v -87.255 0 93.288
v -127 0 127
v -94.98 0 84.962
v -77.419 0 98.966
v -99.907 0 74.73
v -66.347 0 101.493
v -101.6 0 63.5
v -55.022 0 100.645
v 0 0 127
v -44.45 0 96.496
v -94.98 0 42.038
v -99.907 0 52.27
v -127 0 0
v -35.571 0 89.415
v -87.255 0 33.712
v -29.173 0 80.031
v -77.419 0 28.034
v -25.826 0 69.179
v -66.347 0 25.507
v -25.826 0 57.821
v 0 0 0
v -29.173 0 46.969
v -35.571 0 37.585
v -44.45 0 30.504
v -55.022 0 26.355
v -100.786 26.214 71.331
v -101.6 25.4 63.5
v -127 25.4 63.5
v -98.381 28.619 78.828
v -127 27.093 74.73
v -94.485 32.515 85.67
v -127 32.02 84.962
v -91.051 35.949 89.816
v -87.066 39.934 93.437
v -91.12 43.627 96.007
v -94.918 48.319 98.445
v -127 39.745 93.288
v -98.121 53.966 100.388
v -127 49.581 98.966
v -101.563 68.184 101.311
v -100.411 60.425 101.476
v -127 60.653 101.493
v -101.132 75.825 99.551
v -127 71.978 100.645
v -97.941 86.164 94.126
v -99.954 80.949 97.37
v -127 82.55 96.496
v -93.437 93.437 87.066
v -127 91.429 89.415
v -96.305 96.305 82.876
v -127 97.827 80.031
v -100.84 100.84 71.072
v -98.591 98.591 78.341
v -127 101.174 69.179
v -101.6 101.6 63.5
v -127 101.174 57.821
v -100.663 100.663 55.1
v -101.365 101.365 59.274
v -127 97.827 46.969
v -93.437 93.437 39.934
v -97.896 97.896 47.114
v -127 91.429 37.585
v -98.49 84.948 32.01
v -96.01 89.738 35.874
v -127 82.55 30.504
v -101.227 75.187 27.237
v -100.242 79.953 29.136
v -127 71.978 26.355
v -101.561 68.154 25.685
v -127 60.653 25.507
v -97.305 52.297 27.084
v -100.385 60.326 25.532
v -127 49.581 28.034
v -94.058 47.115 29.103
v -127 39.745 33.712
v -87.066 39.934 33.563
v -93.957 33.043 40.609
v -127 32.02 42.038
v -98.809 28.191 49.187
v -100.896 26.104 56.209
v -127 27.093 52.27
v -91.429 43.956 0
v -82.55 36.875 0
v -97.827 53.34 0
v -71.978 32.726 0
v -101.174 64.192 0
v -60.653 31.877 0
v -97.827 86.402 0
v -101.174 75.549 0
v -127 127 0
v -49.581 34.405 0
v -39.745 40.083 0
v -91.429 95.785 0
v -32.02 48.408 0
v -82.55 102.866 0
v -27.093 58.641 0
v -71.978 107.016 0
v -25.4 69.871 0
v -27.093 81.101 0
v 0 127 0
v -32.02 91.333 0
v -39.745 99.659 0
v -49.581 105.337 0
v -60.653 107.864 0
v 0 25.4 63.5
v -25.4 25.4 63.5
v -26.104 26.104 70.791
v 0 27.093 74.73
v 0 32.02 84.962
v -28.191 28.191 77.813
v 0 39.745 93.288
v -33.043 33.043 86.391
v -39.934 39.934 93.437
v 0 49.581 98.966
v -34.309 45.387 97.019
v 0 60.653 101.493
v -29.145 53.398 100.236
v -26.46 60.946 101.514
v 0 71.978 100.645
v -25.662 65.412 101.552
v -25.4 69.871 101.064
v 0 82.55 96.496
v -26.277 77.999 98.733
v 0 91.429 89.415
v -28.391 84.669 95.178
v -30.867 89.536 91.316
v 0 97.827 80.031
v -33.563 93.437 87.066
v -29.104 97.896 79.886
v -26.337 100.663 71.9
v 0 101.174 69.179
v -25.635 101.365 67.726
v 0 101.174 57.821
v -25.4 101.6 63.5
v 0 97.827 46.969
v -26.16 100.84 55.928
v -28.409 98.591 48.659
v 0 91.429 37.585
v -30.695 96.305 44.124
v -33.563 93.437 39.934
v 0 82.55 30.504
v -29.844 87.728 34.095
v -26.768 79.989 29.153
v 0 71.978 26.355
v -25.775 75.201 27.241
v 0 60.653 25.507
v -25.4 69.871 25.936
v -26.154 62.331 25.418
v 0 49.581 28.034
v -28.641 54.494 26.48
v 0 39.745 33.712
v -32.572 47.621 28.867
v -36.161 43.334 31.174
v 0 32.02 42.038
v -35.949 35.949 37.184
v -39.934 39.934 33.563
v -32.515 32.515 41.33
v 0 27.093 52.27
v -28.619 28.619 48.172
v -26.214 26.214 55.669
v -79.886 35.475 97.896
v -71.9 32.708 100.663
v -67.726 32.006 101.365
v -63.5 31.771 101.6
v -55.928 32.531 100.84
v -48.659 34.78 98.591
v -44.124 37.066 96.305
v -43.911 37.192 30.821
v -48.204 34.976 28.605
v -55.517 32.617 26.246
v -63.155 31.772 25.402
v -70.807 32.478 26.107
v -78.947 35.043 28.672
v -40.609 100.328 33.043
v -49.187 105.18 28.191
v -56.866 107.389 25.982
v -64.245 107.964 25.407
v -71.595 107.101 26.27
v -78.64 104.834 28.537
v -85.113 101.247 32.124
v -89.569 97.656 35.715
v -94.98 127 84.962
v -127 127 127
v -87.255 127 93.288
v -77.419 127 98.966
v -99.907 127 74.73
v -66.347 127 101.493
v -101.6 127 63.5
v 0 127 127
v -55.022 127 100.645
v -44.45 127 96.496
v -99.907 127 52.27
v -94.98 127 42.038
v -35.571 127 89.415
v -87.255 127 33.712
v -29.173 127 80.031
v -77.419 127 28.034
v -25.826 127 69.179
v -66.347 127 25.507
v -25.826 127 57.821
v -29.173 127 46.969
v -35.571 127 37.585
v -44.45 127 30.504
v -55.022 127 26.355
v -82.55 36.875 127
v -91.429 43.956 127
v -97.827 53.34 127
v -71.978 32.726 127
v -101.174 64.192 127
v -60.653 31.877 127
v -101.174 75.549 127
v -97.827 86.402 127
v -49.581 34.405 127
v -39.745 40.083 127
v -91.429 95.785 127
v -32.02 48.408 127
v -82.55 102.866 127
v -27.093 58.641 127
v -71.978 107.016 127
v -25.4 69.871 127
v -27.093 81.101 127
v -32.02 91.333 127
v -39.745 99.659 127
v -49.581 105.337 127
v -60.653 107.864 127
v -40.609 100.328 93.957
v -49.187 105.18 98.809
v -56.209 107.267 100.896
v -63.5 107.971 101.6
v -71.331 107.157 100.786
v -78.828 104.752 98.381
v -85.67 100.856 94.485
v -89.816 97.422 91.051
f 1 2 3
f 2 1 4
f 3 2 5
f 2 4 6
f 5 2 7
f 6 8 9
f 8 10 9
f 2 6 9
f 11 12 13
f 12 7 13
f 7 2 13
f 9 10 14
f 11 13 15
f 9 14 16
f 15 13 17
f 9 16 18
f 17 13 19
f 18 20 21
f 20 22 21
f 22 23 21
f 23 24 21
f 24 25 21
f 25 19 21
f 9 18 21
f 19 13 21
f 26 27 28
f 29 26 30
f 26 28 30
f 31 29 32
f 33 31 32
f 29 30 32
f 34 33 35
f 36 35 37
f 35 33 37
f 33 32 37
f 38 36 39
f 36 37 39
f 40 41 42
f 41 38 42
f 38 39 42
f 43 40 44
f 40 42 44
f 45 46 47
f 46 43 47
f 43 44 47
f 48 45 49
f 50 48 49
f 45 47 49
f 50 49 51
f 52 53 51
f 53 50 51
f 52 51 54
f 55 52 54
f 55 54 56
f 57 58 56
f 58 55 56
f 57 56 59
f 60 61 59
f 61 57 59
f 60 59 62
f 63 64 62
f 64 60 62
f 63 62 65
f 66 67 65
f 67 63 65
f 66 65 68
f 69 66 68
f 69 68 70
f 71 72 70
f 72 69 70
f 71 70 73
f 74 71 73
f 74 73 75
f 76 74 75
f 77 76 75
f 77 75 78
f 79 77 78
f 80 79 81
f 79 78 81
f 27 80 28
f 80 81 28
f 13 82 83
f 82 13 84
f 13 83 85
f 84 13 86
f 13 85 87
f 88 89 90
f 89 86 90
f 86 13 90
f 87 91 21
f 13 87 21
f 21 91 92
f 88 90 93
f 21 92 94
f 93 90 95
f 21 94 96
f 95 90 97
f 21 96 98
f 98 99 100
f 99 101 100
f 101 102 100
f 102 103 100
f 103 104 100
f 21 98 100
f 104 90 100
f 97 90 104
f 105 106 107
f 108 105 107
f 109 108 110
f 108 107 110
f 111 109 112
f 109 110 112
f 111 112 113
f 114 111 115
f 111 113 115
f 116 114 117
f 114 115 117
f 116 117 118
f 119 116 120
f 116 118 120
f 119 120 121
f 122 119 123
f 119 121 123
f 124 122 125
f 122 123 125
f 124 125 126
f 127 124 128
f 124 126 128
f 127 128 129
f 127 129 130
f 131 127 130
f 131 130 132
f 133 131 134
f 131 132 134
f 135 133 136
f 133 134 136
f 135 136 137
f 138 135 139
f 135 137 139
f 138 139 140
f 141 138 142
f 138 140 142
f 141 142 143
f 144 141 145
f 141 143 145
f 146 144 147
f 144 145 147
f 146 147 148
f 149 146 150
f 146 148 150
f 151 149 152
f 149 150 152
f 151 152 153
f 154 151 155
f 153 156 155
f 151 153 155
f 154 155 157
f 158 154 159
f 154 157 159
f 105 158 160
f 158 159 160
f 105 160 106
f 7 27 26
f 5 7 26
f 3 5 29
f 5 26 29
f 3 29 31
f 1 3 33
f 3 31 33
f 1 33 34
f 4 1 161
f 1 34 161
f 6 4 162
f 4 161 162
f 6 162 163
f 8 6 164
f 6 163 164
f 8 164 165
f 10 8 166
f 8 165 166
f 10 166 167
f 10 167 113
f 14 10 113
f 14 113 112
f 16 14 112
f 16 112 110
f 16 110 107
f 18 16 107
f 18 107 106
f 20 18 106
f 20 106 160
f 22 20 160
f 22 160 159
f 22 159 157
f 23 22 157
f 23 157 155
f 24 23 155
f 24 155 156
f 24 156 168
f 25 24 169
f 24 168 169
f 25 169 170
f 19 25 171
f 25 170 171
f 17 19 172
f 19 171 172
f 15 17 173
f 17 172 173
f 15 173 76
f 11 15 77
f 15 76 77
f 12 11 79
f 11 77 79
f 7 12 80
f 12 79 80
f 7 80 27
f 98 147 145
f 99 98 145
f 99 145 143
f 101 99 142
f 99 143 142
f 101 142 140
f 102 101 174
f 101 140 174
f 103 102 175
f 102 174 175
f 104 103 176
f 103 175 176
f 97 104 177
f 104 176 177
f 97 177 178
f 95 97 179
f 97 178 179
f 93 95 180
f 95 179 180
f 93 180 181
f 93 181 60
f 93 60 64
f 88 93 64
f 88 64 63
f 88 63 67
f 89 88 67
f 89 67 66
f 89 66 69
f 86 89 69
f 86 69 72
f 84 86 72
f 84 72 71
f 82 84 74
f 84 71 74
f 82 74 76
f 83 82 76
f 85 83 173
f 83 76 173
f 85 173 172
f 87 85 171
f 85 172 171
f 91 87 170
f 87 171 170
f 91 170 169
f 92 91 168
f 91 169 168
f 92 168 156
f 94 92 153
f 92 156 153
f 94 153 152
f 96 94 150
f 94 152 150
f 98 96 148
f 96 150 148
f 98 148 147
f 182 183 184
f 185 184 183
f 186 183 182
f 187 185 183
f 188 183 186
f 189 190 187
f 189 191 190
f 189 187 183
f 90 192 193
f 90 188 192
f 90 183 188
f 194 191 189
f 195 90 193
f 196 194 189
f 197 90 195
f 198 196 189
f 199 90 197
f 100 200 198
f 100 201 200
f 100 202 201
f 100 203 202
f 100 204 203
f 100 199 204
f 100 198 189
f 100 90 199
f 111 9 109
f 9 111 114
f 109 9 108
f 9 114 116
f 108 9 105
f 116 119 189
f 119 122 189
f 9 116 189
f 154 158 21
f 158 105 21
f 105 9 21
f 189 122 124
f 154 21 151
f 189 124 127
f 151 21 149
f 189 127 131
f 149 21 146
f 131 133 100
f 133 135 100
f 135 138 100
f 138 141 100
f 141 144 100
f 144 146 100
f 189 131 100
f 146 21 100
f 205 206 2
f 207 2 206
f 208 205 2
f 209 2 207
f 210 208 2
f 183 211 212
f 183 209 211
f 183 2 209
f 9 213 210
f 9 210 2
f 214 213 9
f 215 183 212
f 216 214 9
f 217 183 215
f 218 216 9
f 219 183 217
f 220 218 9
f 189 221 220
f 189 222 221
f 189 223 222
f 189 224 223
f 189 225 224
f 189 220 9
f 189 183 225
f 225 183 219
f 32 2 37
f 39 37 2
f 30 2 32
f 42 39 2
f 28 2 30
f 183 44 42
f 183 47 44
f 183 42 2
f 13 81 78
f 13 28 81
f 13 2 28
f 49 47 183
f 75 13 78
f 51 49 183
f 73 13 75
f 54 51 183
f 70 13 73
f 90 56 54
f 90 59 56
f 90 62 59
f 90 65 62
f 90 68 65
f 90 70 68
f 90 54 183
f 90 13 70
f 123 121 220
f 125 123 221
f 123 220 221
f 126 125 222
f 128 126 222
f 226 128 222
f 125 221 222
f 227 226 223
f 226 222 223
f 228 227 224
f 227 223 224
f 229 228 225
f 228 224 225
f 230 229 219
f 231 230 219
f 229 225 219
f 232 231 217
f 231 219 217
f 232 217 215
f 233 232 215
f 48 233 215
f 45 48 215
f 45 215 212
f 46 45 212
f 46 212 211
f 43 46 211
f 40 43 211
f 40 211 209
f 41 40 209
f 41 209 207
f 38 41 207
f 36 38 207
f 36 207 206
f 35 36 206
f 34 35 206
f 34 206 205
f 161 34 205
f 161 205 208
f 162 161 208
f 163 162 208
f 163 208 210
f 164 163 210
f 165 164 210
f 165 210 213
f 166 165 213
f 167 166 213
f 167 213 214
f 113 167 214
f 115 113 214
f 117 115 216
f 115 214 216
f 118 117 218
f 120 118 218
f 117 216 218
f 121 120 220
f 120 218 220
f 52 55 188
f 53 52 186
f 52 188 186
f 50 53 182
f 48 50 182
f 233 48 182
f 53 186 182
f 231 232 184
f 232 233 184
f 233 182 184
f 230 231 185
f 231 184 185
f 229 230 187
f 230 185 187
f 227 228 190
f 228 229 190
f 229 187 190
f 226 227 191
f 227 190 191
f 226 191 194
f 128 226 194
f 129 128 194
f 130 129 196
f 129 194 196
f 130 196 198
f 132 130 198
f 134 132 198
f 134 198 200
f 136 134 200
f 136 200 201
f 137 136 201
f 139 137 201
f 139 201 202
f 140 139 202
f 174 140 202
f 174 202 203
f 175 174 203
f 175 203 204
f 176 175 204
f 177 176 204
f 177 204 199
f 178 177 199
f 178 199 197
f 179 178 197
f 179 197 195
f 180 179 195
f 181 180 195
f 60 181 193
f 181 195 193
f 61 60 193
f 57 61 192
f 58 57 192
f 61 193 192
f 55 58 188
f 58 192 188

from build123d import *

# Parameters (mm, degrees)
F0_W     = 127
F0_H     = 127
F1_DEPTH = 127
F4_R     = 38.1
F5_DEPTH = 127
F3_R     = 38.1
F6_DEPTH = 127
F2_R     = 38.1
F7_DEPTH = 127


with BuildPart() as f1:
    # F0 (on Top) → F1 (new body)
    with BuildSketch(Plane.XY):
        with Locations((-63.5, 63.5)):
            Rectangle(F0_W, F0_H)
    extrude(amount=F1_DEPTH)

    # F4 (on face) → F5 (cut)
    with BuildSketch(Plane.XY.offset(127)):
        with Locations((-63.5, 69.870859)):
            Circle(F4_R)
    extrude(amount=-F5_DEPTH, mode=Mode.SUBTRACT)

    # F3 (on face) → F6 (cut)
    with BuildSketch(Plane(origin=(0, 127, 0), x_dir=(-1, 0, 0), z_dir=(0, 1, 0))):
        with Locations((63.5, 63.5)):
            Circle(F3_R)
    extrude(amount=-F6_DEPTH, mode=Mode.SUBTRACT)

    # F2 (on face) → F7 (cut)
    with BuildSketch(Plane(origin=(-127, 0, 0), x_dir=(0, -1, 0), z_dir=(-1, 0, 0))):
        with Locations((-63.5, 63.5)):
            Circle(F2_R)
    extrude(amount=-F7_DEPTH, mode=Mode.SUBTRACT)


solid = f1.part
